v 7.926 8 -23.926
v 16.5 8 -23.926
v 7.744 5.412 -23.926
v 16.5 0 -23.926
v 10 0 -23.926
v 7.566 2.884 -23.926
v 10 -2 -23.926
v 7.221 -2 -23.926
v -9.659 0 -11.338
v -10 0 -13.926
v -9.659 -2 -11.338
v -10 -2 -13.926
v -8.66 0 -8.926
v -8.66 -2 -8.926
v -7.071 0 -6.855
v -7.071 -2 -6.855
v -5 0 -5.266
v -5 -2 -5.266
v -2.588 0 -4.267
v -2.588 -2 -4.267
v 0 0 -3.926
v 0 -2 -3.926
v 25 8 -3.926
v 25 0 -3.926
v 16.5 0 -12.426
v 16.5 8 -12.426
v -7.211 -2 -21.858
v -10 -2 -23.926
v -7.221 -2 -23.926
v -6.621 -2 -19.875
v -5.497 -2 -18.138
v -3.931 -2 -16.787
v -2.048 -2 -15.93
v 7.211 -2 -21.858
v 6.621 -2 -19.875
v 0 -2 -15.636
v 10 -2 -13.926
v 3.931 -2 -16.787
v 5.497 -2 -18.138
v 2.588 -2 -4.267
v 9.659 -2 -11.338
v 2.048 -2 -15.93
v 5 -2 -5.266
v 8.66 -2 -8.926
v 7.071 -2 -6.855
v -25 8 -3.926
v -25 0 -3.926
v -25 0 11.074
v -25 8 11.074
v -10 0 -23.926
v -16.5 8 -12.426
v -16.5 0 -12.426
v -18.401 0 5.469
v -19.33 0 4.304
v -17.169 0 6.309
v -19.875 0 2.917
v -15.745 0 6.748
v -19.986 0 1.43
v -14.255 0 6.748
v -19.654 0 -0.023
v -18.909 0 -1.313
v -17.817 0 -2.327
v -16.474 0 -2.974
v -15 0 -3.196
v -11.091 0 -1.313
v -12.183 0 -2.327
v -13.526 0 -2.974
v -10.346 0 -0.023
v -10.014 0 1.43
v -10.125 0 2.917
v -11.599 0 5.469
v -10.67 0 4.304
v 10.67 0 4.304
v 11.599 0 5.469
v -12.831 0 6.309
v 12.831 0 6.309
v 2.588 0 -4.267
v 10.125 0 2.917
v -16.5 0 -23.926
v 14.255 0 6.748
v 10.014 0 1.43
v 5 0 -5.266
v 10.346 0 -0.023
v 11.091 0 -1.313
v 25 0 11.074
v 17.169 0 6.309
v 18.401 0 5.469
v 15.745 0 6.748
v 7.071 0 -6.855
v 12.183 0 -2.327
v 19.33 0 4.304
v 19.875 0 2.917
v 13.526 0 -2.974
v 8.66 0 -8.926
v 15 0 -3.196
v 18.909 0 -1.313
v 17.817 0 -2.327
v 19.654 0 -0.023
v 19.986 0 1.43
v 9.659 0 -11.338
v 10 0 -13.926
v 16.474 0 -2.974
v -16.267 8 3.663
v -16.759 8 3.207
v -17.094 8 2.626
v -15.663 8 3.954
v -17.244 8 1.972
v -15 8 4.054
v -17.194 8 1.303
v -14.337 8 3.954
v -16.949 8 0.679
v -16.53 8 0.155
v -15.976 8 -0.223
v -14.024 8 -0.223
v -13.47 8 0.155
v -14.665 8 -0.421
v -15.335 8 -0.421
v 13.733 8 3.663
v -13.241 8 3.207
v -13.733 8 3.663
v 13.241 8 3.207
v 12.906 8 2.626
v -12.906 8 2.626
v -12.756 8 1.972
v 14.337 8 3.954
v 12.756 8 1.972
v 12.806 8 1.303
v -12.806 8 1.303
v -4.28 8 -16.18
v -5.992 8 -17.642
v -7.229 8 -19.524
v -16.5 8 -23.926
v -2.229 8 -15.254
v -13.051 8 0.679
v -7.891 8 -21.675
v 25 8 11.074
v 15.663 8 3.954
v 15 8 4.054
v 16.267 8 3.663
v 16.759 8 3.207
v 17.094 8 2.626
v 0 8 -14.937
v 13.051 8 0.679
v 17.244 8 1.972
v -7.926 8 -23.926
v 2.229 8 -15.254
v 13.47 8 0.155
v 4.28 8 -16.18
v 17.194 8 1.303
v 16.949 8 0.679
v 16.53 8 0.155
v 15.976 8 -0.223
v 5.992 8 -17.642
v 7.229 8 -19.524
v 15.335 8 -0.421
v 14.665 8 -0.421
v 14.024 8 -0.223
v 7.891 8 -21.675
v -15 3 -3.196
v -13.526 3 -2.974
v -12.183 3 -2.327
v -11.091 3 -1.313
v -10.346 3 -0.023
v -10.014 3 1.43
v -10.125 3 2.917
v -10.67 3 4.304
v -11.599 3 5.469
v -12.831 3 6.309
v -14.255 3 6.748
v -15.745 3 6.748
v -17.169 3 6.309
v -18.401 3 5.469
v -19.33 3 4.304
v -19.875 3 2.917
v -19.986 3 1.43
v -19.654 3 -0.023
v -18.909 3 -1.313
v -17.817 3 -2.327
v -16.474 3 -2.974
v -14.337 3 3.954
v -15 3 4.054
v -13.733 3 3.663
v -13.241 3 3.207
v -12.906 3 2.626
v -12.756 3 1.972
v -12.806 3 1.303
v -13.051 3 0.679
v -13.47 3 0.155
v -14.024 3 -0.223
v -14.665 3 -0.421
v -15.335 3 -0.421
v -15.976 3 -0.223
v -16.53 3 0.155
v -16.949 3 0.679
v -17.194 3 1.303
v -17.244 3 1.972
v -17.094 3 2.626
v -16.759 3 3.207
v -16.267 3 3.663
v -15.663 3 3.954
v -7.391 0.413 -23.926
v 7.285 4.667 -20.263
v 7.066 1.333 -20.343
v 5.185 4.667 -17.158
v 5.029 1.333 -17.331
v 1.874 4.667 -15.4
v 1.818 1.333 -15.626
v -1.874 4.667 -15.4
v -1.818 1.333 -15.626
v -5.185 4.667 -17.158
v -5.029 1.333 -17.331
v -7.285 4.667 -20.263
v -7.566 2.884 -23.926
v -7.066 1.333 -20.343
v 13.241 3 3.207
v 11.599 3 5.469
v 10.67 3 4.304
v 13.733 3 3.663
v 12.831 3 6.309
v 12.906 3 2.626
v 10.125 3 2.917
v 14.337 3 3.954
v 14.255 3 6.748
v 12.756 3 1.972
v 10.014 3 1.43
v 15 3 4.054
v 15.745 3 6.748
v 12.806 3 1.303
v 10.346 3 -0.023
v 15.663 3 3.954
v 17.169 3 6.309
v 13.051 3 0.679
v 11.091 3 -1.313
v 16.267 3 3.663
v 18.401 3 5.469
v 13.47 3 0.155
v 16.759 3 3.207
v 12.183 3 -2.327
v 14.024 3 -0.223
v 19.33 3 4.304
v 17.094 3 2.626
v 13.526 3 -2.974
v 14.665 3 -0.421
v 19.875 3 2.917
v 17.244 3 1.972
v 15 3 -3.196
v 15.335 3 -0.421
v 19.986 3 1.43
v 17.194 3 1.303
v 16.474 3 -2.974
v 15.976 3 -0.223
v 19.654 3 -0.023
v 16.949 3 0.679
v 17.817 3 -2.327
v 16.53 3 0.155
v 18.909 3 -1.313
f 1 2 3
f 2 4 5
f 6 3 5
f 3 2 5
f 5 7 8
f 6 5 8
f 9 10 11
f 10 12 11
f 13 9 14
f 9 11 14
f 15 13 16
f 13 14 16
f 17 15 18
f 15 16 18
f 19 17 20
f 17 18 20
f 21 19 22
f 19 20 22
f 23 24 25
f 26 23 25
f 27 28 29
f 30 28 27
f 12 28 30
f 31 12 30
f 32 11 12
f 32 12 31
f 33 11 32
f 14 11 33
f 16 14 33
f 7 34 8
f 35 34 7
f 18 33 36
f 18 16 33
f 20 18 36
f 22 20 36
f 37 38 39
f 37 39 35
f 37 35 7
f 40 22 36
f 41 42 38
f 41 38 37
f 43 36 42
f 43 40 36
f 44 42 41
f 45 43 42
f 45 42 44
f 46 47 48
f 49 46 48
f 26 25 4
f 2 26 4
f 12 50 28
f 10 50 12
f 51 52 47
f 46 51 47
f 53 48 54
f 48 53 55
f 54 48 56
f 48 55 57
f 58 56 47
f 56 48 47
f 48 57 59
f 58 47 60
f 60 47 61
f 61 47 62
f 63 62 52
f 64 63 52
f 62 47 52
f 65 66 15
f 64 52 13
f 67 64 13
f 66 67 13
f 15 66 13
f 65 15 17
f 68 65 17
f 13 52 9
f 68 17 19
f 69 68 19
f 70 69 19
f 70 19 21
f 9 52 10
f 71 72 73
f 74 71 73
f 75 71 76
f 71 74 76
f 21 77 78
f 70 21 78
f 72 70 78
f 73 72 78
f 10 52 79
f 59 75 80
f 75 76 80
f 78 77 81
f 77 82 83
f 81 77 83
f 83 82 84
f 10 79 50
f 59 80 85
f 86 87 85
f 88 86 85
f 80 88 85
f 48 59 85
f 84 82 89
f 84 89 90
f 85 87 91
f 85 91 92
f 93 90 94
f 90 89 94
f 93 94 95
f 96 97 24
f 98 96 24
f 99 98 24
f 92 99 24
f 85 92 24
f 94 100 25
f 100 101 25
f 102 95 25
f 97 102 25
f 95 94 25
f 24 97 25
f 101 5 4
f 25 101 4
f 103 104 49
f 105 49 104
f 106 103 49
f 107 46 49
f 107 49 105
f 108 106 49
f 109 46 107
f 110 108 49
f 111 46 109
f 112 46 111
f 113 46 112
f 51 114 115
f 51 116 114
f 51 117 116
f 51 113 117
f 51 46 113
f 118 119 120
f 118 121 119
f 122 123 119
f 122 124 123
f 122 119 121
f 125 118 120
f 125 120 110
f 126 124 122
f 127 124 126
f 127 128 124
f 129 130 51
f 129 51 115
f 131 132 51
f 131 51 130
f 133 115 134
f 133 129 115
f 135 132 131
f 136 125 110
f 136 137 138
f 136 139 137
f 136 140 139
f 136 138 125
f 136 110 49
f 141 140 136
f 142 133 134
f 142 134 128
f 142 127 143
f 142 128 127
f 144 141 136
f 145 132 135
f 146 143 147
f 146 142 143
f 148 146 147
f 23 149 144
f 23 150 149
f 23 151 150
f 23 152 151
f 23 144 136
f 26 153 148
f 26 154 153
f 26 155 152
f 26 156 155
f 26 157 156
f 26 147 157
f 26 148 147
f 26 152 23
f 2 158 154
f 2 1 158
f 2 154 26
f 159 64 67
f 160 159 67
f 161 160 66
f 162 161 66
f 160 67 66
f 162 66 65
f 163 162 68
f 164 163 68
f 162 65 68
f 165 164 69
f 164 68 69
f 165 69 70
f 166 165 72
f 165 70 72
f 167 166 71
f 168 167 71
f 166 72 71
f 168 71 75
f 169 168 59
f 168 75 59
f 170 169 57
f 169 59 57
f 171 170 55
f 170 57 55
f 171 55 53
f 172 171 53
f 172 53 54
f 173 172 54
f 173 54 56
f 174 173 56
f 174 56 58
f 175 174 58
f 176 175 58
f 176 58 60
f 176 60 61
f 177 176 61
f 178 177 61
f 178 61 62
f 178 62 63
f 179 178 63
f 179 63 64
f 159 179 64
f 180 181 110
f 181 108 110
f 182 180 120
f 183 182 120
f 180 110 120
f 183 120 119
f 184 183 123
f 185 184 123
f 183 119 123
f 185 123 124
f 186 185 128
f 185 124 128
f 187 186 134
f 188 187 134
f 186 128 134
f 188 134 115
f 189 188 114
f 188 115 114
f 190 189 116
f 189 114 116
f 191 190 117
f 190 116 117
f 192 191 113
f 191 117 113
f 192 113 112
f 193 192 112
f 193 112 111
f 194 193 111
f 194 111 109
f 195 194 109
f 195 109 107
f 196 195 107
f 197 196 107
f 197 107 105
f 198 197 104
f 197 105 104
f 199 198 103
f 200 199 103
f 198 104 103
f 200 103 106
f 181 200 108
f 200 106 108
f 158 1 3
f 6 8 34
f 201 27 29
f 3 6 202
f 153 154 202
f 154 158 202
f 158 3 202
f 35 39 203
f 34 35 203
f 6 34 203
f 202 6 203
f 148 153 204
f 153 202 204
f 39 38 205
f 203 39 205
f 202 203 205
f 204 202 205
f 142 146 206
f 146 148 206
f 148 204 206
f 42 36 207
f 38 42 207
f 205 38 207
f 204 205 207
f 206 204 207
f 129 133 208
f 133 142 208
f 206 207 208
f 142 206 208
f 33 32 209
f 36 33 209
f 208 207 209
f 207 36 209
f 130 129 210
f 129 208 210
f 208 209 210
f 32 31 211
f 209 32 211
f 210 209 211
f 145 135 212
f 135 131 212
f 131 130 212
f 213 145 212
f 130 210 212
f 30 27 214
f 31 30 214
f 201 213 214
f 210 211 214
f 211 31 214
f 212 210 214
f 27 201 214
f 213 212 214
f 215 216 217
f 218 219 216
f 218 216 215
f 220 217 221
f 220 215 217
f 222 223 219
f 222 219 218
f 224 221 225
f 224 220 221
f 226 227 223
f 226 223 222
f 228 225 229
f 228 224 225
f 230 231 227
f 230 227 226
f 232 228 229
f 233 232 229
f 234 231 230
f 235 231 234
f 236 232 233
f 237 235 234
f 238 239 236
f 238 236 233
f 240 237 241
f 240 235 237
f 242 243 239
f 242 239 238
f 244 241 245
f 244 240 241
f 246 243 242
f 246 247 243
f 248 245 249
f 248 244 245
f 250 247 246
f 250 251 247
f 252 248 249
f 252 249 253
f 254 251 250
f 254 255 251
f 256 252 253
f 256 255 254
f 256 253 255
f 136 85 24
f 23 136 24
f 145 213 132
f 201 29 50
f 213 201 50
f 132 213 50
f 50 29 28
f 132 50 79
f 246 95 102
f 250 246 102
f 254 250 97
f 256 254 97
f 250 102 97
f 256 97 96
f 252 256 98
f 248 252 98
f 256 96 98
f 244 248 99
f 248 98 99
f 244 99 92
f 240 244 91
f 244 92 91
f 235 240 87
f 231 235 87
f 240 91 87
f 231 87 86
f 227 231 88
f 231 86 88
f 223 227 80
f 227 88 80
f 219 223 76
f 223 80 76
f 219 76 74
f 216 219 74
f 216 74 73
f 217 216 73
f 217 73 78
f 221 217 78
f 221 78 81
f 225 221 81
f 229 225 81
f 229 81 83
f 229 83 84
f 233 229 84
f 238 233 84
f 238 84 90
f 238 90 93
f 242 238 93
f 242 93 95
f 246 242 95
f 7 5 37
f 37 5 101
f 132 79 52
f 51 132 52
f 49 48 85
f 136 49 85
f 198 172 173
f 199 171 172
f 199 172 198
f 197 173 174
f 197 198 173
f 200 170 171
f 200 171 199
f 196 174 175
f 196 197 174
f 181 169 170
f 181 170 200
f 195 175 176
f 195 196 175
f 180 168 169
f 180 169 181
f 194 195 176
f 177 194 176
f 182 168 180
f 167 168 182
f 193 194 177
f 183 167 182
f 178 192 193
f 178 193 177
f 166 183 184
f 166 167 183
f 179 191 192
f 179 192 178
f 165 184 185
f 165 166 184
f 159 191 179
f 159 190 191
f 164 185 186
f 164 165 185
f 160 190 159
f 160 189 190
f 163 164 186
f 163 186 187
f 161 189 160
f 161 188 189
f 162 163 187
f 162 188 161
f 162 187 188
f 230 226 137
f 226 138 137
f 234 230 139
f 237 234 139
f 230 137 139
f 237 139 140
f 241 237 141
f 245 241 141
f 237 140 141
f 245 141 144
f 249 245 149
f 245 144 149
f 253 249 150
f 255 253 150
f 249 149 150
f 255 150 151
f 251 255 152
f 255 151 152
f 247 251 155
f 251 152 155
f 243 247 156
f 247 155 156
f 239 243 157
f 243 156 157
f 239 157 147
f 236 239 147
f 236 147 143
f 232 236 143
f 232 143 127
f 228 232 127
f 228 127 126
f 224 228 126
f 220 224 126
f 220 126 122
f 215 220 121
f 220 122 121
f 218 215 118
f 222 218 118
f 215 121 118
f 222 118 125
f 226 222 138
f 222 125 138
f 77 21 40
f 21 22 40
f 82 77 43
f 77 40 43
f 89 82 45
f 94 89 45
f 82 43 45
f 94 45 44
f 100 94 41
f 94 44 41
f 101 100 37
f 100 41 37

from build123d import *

# Parameters (mm, degrees)
BOSS_EXTRUDE1_DEPTH                     = 8
SKETCH2_W                               = 20
SKETCH2_H                               = 20
BOSS_EXTRUDE2_DEPTH                     = 2
FILLET1_R                               = 10
SKETCH3_R                               = 7.29
CUT_EXTRUDE1_DEPTH                      = 37.020349658
CUT_EXTRUDE1_DRAFT                      = 4
CBORE_FOR_M5_HEX_HEAD_BOLT1_D           = 4.5
CBORE_FOR_M5_HEX_HEAD_BOLT1_CBORE_D     = 10
CBORE_FOR_M5_HEX_HEAD_BOLT1_CBORE_DEPTH = 3


with BuildPart() as part:
    # Sketch1 → Boss-Extrude1 (new body)
    with BuildSketch(Plane(origin=(0, 0, 0), x_dir=(1, 0, 0), z_dir=(0, 1, 0))):
        Polygon((-25, 3.926253144), (-25, -11.073746856), (25, -11.073746856), (25, 3.926253144), (16.5, 12.426253144), (16.5, 23.926253144), (-16.5, 23.926253144), (-16.5, 12.426253144), align=None)
    extrude(amount=BOSS_EXTRUDE1_DEPTH)

    # Sketch2 → Boss-Extrude2 (add)
    with BuildSketch(Plane.XZ):
        with Locations((0, -13.926253144)):
            Rectangle(SKETCH2_W, SKETCH2_H)
    extrude(amount=BOSS_EXTRUDE2_DEPTH)

    # Fillet1
    fillet1_edges = [part.edges().sort_by_distance(p)[0] for p in [
        (-10, -1, -3.926253144),
        (10, -1, -3.926253144),
    ]]
    fillet(fillet1_edges, radius=FILLET1_R - 0.0001)  # a hair under: the kernel refuses the full size


with BuildPart() as cut_extrude1_tool:
    # Sketch3 → Cut-Extrude1 (with draft: the straight prism first)
    with BuildSketch(Plane.XZ.offset(2)):
        with Locations((0, -22.926253144)):
            Circle(SKETCH3_R)
    extrude(amount=-CUT_EXTRUDE1_DEPTH)
    # Cut-Extrude1: the draft: its side faces are tilted about the plane it starts from
    cut_extrude1_sides = [cut_extrude1_tool.faces().sort_by_distance(p)[0] for p in [
        (-7.29, 16.510174829, -22.926253144),
    ]]
    draft(cut_extrude1_sides, Plane.XZ.offset(2), CUT_EXTRUDE1_DRAFT)


with BuildPart() as part_1:
    add(part.part)

    # Cut-Extrude1: cut by cut_extrude1_tool
    add(cut_extrude1_tool.part, mode=Mode.SUBTRACT)

    # CBORE for M5 Hex Head Bolt1 (through all)
    with Locations(Plane(origin=(-15, 0, 1.804006093), x_dir=(0, 0, -1), z_dir=(0, -1, 0))):
        with Locations((0, 0), (0, 30)):
            CounterBoreHole(CBORE_FOR_M5_HEX_HEAD_BOLT1_D / 2, CBORE_FOR_M5_HEX_HEAD_BOLT1_CBORE_D / 2, CBORE_FOR_M5_HEX_HEAD_BOLT1_CBORE_DEPTH)


solid = part_1.part
